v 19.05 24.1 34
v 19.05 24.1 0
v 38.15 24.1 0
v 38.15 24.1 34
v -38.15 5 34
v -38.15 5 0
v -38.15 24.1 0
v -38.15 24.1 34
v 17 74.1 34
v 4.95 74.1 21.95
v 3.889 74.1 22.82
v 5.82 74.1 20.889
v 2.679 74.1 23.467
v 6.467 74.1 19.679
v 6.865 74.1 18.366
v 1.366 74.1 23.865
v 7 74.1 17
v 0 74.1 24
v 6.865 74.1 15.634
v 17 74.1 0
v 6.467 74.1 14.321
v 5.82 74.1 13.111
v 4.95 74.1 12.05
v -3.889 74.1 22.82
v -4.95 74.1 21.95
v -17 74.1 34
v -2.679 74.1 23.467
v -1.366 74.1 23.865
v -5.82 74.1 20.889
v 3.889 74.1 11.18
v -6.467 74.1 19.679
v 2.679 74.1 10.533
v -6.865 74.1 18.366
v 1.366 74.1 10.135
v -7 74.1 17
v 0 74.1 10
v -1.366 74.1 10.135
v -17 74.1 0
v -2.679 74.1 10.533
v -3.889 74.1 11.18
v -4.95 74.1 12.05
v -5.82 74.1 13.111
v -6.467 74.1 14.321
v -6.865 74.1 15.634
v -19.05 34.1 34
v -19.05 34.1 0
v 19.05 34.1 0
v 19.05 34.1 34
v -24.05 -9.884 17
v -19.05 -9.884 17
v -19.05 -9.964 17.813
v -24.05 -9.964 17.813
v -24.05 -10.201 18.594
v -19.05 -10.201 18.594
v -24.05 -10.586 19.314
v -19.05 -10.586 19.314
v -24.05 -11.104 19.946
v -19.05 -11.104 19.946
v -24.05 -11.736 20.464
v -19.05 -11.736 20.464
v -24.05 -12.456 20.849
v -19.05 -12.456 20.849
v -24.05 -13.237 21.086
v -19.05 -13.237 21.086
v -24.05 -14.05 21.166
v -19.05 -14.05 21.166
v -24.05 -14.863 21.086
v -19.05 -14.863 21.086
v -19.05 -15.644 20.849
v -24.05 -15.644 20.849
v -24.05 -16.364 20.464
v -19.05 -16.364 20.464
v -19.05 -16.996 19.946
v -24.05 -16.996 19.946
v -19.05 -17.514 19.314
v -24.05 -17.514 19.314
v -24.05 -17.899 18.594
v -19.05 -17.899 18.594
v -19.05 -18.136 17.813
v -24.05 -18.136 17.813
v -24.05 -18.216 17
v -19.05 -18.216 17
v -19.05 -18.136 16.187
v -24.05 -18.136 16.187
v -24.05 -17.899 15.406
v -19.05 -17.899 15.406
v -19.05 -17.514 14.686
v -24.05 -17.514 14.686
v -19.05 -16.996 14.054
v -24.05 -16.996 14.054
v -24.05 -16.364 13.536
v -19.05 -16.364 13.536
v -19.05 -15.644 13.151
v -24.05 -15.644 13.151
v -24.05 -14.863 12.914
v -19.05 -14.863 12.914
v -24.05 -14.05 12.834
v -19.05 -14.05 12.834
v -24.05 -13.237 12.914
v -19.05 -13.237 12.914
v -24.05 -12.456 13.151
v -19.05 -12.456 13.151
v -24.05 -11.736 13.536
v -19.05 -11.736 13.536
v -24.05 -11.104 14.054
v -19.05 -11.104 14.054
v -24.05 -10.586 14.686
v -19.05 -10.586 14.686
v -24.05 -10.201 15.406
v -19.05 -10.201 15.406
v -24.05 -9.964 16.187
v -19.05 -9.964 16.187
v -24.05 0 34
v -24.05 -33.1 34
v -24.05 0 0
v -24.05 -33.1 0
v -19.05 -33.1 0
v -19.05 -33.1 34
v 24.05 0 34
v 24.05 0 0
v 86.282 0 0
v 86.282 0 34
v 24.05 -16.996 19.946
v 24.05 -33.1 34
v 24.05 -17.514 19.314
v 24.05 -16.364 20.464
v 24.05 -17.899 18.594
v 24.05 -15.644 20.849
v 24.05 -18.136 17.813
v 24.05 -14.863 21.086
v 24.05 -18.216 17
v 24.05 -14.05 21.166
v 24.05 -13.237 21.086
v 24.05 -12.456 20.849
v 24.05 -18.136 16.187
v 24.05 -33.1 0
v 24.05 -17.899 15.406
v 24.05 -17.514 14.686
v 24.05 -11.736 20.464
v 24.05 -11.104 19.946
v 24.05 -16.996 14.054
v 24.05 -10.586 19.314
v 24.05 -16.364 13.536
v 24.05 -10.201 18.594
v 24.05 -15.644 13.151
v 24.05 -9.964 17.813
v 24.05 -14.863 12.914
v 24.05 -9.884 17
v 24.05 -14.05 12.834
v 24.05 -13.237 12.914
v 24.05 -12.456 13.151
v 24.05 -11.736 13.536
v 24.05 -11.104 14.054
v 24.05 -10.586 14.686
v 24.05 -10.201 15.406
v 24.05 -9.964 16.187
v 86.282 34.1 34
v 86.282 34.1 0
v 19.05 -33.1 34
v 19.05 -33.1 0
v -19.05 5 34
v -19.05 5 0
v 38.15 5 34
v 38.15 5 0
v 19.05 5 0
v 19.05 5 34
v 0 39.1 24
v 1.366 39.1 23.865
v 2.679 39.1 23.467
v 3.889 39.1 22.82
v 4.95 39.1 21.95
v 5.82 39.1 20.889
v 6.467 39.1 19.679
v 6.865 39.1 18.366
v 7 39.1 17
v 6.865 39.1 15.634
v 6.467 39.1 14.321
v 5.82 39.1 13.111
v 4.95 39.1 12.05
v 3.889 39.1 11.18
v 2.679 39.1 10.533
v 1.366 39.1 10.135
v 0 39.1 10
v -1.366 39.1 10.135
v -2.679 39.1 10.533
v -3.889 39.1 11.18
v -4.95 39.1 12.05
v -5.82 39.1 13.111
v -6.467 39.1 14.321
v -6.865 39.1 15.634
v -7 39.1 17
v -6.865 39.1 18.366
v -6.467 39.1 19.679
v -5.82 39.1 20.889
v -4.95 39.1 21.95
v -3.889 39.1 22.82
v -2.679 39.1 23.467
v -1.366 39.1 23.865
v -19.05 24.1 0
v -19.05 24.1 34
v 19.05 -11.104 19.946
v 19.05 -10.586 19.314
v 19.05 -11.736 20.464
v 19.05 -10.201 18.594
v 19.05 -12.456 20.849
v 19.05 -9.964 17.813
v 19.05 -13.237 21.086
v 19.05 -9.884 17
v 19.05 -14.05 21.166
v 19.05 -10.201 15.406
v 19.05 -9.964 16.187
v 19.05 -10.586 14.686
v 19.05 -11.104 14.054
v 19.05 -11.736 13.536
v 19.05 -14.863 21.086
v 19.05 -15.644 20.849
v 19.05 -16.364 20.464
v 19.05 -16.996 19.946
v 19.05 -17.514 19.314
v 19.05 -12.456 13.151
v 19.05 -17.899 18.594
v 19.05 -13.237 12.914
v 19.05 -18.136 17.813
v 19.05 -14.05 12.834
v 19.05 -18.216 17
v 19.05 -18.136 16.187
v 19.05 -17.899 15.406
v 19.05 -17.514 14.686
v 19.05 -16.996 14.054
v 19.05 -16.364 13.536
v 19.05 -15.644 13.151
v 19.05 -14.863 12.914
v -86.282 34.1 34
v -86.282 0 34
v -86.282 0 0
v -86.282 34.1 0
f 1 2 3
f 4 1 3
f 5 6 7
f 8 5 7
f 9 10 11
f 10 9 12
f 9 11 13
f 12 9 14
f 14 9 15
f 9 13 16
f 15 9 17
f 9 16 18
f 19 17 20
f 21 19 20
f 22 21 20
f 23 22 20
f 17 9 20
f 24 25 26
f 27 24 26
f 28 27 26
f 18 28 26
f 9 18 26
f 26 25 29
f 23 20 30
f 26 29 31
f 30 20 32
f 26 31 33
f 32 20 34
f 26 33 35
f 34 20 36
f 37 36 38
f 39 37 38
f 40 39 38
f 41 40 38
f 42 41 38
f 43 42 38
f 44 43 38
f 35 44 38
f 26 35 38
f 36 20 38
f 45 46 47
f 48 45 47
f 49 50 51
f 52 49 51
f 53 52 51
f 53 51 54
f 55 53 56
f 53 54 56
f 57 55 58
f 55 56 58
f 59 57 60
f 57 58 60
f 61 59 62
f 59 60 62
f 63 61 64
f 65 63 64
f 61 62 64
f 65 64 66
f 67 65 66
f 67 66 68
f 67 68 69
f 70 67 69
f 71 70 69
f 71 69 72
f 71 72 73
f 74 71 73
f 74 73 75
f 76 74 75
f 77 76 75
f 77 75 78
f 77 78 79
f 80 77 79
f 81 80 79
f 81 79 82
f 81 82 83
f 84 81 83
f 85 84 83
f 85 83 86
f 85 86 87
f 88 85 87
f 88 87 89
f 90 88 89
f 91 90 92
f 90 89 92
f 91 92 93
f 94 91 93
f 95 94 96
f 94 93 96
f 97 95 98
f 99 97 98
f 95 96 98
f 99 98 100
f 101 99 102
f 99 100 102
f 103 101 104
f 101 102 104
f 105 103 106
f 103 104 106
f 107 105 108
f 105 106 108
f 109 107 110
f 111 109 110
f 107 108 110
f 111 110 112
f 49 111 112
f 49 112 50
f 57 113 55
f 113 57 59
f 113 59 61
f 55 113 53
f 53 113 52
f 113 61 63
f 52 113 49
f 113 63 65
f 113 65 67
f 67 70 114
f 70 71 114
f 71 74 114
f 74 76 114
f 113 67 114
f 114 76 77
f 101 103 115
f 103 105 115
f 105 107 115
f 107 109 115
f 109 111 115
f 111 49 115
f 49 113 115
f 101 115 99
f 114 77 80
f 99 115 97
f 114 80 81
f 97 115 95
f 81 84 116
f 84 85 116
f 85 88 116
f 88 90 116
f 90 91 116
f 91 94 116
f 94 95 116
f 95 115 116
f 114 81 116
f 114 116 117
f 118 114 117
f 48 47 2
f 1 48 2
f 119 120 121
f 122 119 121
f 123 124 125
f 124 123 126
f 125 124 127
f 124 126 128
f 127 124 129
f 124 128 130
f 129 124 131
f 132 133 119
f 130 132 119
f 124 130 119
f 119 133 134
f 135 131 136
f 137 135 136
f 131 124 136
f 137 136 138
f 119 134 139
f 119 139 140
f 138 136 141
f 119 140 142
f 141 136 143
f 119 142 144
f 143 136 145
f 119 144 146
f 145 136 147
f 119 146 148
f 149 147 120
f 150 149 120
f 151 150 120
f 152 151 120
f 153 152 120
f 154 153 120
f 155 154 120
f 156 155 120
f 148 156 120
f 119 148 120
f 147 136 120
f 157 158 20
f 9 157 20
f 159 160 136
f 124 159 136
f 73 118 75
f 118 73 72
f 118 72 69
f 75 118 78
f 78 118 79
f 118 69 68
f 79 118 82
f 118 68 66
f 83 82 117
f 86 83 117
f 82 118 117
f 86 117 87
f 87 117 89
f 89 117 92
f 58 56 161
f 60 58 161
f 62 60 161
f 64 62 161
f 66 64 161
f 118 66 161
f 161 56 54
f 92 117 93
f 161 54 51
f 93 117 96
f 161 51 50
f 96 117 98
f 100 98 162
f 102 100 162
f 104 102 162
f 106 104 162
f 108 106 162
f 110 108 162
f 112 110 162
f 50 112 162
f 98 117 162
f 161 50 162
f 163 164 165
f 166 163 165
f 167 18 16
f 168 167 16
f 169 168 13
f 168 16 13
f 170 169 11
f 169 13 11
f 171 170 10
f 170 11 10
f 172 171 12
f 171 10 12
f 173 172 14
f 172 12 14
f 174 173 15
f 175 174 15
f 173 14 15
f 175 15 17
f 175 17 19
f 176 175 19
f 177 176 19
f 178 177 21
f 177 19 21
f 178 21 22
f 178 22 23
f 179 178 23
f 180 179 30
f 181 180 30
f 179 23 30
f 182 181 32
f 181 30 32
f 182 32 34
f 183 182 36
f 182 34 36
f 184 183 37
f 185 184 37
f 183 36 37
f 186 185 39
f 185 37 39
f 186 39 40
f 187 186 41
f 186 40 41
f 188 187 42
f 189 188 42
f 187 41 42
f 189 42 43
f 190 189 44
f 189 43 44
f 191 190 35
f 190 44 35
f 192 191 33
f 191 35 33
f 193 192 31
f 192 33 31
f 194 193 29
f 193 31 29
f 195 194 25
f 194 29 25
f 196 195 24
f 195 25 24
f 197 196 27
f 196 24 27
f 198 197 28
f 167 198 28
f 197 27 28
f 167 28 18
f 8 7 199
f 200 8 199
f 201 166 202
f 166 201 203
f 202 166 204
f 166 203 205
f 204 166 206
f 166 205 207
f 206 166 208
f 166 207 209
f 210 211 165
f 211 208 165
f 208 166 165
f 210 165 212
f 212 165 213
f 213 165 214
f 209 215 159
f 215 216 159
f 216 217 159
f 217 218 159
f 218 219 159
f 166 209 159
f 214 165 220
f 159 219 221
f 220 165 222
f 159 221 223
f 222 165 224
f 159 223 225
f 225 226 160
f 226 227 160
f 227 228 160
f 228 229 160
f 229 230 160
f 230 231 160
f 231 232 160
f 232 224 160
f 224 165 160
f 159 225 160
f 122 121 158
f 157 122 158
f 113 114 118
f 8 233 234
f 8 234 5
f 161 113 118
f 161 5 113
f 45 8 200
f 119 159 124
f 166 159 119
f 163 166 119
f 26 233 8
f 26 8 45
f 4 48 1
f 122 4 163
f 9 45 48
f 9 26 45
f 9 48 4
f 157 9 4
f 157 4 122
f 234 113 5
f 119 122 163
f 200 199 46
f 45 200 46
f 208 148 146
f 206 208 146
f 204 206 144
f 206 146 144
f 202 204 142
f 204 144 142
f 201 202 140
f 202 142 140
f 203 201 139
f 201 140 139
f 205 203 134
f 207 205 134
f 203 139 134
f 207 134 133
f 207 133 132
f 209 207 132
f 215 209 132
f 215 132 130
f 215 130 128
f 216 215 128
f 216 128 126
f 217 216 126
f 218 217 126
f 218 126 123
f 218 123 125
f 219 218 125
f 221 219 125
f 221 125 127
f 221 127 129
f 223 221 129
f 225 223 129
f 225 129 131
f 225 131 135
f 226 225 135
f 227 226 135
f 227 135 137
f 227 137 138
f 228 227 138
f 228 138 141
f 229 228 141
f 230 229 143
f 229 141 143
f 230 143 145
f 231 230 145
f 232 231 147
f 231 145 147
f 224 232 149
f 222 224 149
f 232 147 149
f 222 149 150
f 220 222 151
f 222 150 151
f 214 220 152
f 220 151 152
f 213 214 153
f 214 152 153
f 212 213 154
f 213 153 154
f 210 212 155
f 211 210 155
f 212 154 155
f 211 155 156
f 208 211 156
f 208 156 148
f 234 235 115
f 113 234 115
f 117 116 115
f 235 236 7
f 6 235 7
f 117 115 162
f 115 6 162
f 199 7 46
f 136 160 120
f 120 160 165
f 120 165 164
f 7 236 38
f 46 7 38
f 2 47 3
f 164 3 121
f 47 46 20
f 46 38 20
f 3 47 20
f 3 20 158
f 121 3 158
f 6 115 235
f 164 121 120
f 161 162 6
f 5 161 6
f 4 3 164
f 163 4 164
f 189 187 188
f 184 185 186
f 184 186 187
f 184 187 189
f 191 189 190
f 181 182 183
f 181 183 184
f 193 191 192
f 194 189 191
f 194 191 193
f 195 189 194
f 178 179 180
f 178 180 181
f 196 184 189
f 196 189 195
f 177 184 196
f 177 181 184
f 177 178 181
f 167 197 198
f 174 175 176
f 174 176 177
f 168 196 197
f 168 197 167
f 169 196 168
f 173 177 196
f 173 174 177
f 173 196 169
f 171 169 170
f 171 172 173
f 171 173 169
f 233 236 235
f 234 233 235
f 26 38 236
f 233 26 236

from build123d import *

# Parameters (mm, degrees)
BOSS_EXTRUDE1_DEPTH = 34
SKETCH2_R           = 7
CUT_EXTRUDE1_DEPTH  = 35
SKETCH3_R           = 4.1656
CUT_EXTRUDE2_DEPTH  = 138.185886126


with BuildPart() as part:
    # Sketch1 → Boss-Extrude1 (new body)
    with BuildSketch(Plane.XY):
        Polygon((-86.282032303, 0), (-24.05, 0), (-24.05, -33.1), (-19.05, -33.1), (-19.05, 5), (-38.15, 5), (-38.15, 24.1), (-19.05, 24.1), (-19.05, 34.1), (19.05, 34.1), (19.05, 24.1), (38.15, 24.1), (38.15, 5), (19.05, 5), (19.05, -33.1), (24.05, -33.1), (24.05, 0), (86.282032303, 0), (86.282032303, 34.1), (17, 74.1), (-17, 74.1), (-86.282032303, 34.1), align=None)
    extrude(amount=BOSS_EXTRUDE1_DEPTH)

    # Sketch2 → Cut-Extrude1 (cut)
    with BuildSketch(Plane(origin=(0, 74.1, 0), x_dir=(1, 0, 0), z_dir=(0, 1, 0))):
        with Locations(Location((0, -17, 0), (0, 0, 270))):
            Circle(SKETCH2_R)
    extrude(amount=-CUT_EXTRUDE1_DEPTH, mode=Mode.SUBTRACT)

    # Sketch3 → Cut-Extrude2 (cut, through all)
    with BuildSketch(Plane(origin=(24.05, 0, 0), x_dir=(0, 0, -1), z_dir=(1, 0, 0))):
        with Locations(Location((-17, -14.05, 0), (0, 0, 90))):
            Circle(SKETCH3_R)
    extrude(amount=-CUT_EXTRUDE2_DEPTH, mode=Mode.SUBTRACT)


solid = part.part
